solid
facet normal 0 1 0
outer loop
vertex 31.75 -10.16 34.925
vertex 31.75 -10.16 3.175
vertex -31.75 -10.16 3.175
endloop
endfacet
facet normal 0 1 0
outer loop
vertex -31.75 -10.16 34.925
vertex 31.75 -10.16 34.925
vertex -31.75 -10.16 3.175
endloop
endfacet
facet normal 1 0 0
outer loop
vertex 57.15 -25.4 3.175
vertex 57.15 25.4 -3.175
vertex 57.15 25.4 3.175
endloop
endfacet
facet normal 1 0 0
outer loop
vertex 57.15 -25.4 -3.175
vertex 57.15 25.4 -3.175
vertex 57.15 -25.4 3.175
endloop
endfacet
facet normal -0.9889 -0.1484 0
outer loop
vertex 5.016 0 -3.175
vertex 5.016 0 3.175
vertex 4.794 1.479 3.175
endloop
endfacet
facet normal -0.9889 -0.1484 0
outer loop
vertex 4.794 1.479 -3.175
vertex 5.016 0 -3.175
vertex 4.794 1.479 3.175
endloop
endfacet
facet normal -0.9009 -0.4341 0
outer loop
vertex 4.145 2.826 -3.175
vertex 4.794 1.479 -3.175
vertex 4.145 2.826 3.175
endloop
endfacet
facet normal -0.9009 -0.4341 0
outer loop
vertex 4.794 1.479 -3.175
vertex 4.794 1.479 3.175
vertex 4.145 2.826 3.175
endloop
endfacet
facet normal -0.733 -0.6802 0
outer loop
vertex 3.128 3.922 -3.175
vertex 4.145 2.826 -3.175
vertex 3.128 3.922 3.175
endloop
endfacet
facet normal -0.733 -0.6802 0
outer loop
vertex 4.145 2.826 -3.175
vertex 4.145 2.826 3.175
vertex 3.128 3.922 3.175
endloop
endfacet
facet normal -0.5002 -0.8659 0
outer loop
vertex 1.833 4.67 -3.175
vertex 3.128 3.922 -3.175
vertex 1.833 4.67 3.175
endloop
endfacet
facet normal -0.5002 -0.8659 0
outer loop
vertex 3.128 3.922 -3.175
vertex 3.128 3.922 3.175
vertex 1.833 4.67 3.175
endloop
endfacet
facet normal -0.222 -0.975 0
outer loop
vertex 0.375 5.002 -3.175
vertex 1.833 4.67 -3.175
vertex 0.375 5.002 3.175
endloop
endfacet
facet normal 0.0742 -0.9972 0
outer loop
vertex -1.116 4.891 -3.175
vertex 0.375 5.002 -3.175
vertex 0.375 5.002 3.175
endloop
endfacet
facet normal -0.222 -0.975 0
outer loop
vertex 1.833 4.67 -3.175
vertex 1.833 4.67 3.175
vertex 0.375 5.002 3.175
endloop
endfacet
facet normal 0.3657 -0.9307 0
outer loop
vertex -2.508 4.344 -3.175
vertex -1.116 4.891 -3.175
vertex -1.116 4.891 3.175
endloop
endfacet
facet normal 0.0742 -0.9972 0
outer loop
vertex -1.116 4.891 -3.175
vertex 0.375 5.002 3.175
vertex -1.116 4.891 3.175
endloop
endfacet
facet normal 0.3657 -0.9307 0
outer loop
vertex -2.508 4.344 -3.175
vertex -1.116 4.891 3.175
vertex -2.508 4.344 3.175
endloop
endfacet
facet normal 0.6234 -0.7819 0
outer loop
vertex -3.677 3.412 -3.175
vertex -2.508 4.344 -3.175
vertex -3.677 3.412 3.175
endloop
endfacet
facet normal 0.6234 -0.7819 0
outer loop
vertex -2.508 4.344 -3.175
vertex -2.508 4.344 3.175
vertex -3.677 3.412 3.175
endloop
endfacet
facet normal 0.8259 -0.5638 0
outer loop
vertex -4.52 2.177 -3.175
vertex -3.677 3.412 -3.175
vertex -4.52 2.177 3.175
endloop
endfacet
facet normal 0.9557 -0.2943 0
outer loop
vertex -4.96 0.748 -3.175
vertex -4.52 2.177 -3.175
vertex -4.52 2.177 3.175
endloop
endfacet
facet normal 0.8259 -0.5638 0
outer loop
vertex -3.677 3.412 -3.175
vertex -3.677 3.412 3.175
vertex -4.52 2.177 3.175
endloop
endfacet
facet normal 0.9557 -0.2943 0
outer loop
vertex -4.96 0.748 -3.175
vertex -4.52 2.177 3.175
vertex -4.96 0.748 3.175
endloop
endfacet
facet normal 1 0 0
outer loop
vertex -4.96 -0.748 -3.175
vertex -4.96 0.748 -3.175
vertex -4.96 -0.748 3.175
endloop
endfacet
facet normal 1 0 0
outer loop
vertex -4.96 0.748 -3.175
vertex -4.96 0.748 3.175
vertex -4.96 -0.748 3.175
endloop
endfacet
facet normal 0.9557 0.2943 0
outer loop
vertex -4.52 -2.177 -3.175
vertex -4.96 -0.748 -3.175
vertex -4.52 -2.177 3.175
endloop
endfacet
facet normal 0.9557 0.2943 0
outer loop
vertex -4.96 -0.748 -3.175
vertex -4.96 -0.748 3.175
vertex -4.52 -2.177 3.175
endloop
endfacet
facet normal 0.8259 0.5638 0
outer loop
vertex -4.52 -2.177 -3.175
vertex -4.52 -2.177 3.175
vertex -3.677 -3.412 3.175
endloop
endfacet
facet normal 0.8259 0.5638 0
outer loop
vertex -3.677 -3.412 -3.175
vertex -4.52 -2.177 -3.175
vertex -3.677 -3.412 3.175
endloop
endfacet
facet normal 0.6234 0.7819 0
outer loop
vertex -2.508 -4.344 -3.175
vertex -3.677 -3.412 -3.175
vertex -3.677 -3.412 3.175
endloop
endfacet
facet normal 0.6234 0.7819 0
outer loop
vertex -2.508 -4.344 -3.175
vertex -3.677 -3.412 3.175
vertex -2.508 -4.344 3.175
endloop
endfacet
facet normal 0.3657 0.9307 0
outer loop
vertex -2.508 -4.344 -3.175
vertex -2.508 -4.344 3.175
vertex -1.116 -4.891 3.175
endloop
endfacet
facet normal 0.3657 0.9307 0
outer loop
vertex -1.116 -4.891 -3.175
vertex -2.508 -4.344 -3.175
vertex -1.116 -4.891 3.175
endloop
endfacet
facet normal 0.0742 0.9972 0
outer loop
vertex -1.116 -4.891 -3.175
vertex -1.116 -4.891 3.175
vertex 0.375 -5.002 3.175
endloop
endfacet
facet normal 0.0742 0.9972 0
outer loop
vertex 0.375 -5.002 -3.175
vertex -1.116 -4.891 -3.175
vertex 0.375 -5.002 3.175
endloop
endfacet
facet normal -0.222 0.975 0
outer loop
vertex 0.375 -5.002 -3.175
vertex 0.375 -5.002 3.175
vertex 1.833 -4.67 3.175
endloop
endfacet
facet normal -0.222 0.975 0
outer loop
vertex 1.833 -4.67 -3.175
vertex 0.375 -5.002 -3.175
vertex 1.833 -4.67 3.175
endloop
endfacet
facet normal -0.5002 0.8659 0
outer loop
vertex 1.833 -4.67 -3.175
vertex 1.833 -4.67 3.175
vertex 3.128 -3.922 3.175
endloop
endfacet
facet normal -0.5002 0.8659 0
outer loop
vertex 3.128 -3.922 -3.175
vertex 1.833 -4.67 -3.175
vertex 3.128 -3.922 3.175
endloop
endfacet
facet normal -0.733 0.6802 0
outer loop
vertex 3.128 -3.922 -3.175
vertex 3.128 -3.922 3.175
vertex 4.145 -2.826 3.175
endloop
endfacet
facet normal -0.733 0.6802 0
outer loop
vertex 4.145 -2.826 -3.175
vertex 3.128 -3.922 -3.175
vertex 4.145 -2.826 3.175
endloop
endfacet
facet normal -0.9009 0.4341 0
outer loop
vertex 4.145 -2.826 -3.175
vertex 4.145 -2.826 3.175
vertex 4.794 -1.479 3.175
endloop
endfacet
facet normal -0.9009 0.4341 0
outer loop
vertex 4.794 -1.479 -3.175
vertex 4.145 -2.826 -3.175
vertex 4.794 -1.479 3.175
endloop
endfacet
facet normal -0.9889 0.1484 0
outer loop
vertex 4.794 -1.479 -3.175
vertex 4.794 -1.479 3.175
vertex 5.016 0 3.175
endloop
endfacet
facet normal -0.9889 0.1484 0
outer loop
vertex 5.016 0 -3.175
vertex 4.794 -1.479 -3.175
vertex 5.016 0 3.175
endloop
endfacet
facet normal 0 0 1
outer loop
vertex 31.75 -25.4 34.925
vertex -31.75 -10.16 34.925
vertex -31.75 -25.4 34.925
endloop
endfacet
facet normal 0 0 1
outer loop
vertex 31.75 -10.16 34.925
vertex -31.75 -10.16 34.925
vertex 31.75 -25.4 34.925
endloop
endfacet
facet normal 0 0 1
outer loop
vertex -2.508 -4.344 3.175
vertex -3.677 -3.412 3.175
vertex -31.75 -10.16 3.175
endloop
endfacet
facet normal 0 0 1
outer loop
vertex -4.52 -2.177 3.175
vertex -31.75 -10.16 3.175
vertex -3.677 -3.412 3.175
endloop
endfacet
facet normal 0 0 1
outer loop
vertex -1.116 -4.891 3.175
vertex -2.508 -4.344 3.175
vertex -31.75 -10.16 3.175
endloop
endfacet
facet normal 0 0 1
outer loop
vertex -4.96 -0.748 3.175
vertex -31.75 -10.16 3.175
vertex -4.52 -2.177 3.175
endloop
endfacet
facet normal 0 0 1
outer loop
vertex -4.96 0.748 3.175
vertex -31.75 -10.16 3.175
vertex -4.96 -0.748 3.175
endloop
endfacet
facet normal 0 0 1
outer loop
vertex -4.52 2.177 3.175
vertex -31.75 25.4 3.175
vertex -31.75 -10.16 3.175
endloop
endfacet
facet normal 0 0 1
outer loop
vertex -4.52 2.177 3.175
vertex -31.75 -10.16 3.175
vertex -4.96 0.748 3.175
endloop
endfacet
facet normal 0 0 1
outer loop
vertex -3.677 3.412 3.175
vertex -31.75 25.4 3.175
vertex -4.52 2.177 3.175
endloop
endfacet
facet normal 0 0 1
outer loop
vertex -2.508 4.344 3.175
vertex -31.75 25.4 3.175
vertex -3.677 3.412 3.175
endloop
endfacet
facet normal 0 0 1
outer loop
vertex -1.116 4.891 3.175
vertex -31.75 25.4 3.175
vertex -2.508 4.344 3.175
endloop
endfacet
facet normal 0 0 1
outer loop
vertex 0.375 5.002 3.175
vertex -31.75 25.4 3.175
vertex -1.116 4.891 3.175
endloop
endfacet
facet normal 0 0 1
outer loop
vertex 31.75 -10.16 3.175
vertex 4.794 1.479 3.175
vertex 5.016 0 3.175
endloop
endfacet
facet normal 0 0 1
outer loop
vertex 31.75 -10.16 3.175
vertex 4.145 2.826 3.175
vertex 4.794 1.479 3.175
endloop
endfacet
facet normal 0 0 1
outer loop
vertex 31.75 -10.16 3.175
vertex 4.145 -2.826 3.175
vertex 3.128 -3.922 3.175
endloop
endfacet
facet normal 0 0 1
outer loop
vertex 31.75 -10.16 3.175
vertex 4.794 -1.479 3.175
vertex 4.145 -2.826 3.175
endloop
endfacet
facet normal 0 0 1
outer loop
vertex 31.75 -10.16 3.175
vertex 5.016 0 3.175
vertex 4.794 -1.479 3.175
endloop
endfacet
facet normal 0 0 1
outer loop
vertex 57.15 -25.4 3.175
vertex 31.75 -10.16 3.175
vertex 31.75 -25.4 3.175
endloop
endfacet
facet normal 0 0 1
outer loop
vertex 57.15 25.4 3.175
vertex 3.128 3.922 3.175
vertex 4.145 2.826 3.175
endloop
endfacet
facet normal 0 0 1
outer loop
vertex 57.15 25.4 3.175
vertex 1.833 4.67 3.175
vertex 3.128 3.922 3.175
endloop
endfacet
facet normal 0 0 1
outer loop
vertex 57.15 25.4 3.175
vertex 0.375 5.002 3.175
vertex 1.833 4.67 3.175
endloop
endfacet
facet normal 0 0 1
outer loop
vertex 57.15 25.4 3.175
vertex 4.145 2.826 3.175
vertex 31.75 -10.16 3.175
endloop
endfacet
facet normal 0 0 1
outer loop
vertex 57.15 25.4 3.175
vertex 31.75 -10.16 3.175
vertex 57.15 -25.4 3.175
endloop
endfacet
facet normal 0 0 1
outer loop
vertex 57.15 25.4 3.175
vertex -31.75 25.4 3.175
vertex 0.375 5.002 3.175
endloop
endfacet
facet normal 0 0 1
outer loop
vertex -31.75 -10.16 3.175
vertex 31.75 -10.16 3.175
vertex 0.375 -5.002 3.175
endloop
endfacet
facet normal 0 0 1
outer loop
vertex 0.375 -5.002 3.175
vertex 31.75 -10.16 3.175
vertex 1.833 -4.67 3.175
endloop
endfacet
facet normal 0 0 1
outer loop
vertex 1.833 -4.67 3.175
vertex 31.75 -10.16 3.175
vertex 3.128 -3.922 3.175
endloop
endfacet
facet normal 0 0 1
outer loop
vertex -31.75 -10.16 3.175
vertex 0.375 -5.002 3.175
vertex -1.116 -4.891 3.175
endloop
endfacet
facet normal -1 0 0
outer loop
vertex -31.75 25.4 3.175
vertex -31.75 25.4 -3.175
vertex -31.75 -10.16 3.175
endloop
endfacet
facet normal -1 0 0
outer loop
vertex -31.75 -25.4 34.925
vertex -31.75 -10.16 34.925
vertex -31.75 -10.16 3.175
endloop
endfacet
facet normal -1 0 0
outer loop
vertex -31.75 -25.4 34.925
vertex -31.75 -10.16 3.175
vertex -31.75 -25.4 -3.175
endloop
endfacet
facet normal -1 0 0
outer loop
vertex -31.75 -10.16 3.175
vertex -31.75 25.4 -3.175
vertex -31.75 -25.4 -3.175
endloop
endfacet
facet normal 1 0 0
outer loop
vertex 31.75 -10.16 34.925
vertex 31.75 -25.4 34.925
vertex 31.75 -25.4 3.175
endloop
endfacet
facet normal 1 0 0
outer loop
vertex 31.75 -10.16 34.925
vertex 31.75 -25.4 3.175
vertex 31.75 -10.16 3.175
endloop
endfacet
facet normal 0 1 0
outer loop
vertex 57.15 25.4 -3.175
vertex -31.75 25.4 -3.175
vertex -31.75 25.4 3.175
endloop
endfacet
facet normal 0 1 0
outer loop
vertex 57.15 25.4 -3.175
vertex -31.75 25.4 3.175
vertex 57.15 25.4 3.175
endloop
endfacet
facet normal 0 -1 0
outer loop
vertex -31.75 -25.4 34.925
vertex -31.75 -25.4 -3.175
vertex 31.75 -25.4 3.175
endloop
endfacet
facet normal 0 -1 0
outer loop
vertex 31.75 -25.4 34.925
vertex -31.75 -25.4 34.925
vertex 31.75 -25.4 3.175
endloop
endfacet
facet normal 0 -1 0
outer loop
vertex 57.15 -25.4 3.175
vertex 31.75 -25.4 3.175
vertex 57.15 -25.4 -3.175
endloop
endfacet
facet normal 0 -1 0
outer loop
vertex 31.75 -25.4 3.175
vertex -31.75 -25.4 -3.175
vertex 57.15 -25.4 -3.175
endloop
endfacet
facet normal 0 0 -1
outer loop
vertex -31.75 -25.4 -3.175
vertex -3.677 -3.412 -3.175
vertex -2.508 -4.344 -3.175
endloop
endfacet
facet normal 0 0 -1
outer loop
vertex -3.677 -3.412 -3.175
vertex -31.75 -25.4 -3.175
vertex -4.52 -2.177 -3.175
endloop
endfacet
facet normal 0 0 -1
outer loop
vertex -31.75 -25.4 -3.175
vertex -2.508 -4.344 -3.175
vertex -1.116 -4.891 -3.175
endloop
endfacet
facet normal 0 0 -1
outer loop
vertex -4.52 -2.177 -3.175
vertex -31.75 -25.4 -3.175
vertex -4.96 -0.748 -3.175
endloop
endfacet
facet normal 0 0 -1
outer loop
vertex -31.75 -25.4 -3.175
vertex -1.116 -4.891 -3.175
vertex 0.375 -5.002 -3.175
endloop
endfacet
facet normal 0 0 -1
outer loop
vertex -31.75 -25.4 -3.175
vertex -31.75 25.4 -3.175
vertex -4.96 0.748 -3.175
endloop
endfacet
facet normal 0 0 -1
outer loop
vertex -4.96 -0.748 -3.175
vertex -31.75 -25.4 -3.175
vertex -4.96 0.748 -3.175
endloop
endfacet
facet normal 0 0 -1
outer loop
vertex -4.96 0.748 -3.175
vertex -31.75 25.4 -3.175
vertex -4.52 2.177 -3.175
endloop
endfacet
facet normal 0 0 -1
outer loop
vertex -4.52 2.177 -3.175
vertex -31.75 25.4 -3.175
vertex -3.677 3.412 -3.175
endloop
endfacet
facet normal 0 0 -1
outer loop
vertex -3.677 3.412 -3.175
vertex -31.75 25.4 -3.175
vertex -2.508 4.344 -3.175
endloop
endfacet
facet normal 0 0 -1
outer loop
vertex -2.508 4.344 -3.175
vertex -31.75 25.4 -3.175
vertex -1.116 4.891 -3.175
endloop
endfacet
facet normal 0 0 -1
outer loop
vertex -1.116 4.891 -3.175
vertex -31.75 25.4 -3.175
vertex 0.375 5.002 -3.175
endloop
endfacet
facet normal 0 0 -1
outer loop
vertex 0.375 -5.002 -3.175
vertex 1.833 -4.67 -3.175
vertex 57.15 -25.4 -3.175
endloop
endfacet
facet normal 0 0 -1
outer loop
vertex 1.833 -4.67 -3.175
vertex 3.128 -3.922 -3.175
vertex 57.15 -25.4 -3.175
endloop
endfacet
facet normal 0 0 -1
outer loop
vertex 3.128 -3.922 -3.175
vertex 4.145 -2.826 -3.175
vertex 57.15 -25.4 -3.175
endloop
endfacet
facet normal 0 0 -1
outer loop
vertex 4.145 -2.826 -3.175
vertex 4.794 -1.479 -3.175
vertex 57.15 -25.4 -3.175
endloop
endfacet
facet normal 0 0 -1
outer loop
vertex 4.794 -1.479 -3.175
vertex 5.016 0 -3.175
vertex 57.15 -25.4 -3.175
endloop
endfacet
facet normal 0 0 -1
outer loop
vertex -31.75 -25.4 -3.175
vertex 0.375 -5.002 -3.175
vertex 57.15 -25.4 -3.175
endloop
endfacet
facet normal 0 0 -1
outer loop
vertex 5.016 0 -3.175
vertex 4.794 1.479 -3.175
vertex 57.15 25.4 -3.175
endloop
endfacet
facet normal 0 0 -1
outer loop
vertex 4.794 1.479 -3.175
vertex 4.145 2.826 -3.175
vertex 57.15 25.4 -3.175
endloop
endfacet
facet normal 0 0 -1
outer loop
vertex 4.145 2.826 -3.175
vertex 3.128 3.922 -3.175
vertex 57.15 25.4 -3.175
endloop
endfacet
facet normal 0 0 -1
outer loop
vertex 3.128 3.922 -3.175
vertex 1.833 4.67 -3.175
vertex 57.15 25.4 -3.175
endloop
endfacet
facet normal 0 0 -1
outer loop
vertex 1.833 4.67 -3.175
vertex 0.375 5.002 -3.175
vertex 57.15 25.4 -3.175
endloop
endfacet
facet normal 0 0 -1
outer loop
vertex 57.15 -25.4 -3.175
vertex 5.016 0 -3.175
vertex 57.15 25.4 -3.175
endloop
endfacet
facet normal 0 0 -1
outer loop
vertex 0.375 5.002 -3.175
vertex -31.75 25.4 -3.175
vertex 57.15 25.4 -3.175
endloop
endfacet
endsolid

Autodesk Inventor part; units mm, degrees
ref_plane "YZ Plane" through (0, 0, 0) normal (1, 0, 0) x (0, 1, 0)
ref_plane "XZ Plane" through (0, 0, 0) normal (0, 1, 0) x (-1, 0, 0)
ref_plane "XY Plane" through (0, 0, 0) normal (0, 0, 1) x (1, 0, 0)
sketch "Sketch2" plane through (0, 0, 0) normal (0, 0, 1) x (1, 0, 0)
  line L0 (0, 0) -> (-31.75, 0) construction
  line L1 (-31.75, 0) -> (-31.75, -25.4)
  line L2 (-31.75, 0) -> (-31.75, 25.4)
  line L3 (-31.75, 25.4) -> (57.15, 25.4)
  line L4 (0, 0) -> (0, -25.4) construction
  line L5 (0, 0) -> (57.15, 0) construction
  line L6 (-31.75, -25.4) -> (57.15, -25.4)
  line L7 (57.15, 25.4) -> (57.15, -25.4)
  dimension "edgeToCenterOfPiston" = 31.75
  dimension "heiight" = 50.8
  dimension "width" = 88.9
  dimension "d7" = 88.9
  dimension "d8" = 88.9
extrude "Extrusion1" add sketch "Sketch2" along normal mid plane 6.35
sketch "Sketch3" plane through (0, 0, 3.175) normal (0, 0, 1) x (1, 0, 0)
  circle A0 centre (0, 0) radius 5.0165
  dimension "d11" = 10.033
extrude "Extrusion2" cut sketch "Sketch3" against normal through all
sketch "Sketch4" plane through (0, 0, 3.175) normal (0, 0, 1) x (1, 0, 0)
  line L0 (-31.75, 25.4) -> (-31.75, -25.4) projected
  line L1 (-31.75, -25.4) -> (31.75, -25.4)
  line L2 (31.75, -25.4) -> (31.75, -10.16)
  line L3 (31.75, -10.16) -> (-31.75, -10.16)
  line L4 (-31.75, -10.16) -> (-31.75, -25.4)
  point P0 (0, 0)
  dimension "d14" = 63.5
  dimension "d15" = 15.24
extrude "Extrusion3" add sketch "Sketch4" along normal blind 31.75
equation "\"d7\" = width"
equation "\"d8\" = width"
properties part number "Gripper Piston" material "Aluminum 6061"
